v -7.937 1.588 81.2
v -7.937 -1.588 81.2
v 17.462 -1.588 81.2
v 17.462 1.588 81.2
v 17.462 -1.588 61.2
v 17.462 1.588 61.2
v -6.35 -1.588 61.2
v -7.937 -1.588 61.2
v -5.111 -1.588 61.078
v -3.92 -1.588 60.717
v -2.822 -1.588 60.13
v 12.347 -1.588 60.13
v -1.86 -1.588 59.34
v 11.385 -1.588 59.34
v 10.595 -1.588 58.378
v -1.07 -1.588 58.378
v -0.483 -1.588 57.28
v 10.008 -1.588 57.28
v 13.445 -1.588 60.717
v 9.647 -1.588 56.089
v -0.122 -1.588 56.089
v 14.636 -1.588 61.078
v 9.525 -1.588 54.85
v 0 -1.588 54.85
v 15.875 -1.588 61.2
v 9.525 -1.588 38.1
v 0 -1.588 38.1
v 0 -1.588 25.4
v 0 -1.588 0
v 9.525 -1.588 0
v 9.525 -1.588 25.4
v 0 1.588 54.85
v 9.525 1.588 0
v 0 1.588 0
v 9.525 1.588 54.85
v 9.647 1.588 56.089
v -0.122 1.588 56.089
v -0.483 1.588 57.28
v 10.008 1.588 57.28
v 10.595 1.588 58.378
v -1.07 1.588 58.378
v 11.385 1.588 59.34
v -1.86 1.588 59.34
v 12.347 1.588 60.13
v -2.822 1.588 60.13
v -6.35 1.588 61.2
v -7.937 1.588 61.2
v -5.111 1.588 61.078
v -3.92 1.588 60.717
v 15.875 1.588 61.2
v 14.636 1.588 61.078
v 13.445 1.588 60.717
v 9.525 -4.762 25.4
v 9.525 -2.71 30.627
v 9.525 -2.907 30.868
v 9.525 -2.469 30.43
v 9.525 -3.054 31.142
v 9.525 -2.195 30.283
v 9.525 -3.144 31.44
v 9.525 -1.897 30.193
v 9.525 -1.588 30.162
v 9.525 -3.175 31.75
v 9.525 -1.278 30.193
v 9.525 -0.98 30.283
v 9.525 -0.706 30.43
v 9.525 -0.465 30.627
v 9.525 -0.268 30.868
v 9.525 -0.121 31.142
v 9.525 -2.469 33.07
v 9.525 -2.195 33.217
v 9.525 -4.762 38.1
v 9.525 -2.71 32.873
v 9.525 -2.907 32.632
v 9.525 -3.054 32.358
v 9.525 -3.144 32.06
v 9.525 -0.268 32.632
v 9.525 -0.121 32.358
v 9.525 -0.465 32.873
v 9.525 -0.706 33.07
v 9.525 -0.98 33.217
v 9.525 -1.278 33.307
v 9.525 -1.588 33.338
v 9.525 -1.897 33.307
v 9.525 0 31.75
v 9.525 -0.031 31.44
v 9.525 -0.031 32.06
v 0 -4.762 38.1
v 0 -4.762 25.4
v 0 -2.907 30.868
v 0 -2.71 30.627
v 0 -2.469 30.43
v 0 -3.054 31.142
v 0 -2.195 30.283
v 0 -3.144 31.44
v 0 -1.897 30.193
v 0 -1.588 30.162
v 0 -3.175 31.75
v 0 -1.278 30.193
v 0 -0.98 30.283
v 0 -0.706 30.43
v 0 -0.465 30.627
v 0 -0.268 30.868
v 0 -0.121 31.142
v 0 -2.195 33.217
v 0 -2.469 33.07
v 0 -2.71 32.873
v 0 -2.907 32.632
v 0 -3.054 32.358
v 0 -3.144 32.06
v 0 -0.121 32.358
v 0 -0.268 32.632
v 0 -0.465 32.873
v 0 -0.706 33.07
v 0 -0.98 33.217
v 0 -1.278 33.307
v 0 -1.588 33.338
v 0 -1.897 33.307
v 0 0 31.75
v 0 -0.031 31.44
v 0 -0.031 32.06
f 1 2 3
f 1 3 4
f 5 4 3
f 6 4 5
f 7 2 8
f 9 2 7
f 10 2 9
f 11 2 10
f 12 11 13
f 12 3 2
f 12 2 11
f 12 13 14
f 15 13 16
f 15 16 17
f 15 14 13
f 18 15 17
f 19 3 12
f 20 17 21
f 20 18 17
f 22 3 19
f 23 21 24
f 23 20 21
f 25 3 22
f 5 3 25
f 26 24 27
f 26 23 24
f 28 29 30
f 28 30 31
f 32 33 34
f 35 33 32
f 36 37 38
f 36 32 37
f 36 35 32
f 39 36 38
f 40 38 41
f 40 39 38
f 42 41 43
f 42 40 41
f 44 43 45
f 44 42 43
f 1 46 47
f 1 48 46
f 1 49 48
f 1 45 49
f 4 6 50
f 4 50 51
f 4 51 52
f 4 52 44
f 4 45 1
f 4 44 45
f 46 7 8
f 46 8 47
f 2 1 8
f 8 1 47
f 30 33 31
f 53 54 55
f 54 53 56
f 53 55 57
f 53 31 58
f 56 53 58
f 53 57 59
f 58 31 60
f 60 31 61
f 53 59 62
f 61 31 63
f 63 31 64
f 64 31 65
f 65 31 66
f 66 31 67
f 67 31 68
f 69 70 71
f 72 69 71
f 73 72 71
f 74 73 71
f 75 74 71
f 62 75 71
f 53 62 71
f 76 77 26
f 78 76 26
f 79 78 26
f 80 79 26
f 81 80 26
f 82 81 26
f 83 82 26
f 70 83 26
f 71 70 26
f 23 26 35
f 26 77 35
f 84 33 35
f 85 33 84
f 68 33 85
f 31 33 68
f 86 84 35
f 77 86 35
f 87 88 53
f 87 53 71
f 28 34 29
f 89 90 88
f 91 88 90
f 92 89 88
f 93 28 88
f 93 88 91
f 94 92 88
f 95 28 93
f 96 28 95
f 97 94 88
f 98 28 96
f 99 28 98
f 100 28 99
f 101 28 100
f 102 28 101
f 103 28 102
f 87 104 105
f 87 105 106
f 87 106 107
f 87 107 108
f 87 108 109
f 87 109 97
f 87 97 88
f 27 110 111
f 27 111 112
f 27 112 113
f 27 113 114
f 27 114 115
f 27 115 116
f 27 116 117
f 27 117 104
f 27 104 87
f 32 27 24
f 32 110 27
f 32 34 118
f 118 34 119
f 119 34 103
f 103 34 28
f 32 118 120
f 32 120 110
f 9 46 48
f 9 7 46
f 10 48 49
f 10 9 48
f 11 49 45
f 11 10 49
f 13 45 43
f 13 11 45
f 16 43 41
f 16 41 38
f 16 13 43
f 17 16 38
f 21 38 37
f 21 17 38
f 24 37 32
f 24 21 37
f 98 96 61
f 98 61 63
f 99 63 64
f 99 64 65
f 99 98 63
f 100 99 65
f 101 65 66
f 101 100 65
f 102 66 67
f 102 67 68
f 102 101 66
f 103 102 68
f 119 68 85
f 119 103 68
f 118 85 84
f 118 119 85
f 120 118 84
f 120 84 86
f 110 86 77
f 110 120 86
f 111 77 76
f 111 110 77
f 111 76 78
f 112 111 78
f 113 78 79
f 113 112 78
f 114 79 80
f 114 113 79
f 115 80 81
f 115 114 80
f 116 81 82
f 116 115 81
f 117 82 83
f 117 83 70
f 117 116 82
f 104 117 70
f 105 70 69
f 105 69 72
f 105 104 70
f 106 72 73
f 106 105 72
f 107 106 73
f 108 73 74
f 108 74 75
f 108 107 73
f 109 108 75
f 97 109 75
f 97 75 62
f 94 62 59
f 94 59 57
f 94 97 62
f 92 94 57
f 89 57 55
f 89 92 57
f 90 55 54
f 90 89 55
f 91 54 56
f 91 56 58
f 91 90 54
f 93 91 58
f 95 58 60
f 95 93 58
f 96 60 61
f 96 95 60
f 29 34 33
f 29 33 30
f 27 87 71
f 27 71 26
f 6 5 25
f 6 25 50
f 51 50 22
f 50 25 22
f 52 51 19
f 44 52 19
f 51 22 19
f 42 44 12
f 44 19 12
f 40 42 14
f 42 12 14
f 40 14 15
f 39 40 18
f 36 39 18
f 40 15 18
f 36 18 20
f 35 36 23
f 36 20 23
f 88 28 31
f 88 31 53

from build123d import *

# Parameters (mm, degrees)
SKETCH1_R           = 1.5875
BOSS_EXTRUDE1_DEPTH = 9.525
SKETCH3_W           = 15
SKETCH3_H           = 3.175
SKETCH3_W_2         = 5
BOSS_EXTRUDE2_DEPTH = 12.7
FILLET1_R           = 6.35


with BuildPart() as part:
    # Sketch1 → Boss-Extrude1 (new body)
    with BuildSketch(Plane(origin=(0, 0, 0), x_dir=(0, 0, -1), z_dir=(1, 0, 0))):
        Polygon((0, 1.5875), (0, -1.5875), (-25.4, -1.5875), (-25.4, -4.7625), (-38.1, -4.7625), (-38.1, -1.5875), (-76.2, -1.5875), (-76.2, 1.5875), align=None)
        with Locations((-31.75, -1.5875)):
            Circle(SKETCH1_R, mode=Mode.SUBTRACT)
    extrude(amount=BOSS_EXTRUDE1_DEPTH)

    # Sketch3 → Boss-Extrude2 (add, symmetric)
    with BuildSketch(Plane(origin=(4.7625, 0, 0), x_dir=(0, 0, -1), z_dir=(1, 0, 0))):
        with Locations((-68.7, 0)):
            Rectangle(SKETCH3_W, SKETCH3_H)
        with Locations((-78.7, 0)):
            Rectangle(SKETCH3_W_2, SKETCH3_H)
    extrude(amount=BOSS_EXTRUDE2_DEPTH, both=True)

    # Fillet1
    fillet1_edges = [part.edges().sort_by_distance(p)[0] for p in [
        (0, 0, 61.2),
        (9.525, 0, 61.2),
    ]]
    fillet(fillet1_edges, radius=FILLET1_R)


solid = part.part
